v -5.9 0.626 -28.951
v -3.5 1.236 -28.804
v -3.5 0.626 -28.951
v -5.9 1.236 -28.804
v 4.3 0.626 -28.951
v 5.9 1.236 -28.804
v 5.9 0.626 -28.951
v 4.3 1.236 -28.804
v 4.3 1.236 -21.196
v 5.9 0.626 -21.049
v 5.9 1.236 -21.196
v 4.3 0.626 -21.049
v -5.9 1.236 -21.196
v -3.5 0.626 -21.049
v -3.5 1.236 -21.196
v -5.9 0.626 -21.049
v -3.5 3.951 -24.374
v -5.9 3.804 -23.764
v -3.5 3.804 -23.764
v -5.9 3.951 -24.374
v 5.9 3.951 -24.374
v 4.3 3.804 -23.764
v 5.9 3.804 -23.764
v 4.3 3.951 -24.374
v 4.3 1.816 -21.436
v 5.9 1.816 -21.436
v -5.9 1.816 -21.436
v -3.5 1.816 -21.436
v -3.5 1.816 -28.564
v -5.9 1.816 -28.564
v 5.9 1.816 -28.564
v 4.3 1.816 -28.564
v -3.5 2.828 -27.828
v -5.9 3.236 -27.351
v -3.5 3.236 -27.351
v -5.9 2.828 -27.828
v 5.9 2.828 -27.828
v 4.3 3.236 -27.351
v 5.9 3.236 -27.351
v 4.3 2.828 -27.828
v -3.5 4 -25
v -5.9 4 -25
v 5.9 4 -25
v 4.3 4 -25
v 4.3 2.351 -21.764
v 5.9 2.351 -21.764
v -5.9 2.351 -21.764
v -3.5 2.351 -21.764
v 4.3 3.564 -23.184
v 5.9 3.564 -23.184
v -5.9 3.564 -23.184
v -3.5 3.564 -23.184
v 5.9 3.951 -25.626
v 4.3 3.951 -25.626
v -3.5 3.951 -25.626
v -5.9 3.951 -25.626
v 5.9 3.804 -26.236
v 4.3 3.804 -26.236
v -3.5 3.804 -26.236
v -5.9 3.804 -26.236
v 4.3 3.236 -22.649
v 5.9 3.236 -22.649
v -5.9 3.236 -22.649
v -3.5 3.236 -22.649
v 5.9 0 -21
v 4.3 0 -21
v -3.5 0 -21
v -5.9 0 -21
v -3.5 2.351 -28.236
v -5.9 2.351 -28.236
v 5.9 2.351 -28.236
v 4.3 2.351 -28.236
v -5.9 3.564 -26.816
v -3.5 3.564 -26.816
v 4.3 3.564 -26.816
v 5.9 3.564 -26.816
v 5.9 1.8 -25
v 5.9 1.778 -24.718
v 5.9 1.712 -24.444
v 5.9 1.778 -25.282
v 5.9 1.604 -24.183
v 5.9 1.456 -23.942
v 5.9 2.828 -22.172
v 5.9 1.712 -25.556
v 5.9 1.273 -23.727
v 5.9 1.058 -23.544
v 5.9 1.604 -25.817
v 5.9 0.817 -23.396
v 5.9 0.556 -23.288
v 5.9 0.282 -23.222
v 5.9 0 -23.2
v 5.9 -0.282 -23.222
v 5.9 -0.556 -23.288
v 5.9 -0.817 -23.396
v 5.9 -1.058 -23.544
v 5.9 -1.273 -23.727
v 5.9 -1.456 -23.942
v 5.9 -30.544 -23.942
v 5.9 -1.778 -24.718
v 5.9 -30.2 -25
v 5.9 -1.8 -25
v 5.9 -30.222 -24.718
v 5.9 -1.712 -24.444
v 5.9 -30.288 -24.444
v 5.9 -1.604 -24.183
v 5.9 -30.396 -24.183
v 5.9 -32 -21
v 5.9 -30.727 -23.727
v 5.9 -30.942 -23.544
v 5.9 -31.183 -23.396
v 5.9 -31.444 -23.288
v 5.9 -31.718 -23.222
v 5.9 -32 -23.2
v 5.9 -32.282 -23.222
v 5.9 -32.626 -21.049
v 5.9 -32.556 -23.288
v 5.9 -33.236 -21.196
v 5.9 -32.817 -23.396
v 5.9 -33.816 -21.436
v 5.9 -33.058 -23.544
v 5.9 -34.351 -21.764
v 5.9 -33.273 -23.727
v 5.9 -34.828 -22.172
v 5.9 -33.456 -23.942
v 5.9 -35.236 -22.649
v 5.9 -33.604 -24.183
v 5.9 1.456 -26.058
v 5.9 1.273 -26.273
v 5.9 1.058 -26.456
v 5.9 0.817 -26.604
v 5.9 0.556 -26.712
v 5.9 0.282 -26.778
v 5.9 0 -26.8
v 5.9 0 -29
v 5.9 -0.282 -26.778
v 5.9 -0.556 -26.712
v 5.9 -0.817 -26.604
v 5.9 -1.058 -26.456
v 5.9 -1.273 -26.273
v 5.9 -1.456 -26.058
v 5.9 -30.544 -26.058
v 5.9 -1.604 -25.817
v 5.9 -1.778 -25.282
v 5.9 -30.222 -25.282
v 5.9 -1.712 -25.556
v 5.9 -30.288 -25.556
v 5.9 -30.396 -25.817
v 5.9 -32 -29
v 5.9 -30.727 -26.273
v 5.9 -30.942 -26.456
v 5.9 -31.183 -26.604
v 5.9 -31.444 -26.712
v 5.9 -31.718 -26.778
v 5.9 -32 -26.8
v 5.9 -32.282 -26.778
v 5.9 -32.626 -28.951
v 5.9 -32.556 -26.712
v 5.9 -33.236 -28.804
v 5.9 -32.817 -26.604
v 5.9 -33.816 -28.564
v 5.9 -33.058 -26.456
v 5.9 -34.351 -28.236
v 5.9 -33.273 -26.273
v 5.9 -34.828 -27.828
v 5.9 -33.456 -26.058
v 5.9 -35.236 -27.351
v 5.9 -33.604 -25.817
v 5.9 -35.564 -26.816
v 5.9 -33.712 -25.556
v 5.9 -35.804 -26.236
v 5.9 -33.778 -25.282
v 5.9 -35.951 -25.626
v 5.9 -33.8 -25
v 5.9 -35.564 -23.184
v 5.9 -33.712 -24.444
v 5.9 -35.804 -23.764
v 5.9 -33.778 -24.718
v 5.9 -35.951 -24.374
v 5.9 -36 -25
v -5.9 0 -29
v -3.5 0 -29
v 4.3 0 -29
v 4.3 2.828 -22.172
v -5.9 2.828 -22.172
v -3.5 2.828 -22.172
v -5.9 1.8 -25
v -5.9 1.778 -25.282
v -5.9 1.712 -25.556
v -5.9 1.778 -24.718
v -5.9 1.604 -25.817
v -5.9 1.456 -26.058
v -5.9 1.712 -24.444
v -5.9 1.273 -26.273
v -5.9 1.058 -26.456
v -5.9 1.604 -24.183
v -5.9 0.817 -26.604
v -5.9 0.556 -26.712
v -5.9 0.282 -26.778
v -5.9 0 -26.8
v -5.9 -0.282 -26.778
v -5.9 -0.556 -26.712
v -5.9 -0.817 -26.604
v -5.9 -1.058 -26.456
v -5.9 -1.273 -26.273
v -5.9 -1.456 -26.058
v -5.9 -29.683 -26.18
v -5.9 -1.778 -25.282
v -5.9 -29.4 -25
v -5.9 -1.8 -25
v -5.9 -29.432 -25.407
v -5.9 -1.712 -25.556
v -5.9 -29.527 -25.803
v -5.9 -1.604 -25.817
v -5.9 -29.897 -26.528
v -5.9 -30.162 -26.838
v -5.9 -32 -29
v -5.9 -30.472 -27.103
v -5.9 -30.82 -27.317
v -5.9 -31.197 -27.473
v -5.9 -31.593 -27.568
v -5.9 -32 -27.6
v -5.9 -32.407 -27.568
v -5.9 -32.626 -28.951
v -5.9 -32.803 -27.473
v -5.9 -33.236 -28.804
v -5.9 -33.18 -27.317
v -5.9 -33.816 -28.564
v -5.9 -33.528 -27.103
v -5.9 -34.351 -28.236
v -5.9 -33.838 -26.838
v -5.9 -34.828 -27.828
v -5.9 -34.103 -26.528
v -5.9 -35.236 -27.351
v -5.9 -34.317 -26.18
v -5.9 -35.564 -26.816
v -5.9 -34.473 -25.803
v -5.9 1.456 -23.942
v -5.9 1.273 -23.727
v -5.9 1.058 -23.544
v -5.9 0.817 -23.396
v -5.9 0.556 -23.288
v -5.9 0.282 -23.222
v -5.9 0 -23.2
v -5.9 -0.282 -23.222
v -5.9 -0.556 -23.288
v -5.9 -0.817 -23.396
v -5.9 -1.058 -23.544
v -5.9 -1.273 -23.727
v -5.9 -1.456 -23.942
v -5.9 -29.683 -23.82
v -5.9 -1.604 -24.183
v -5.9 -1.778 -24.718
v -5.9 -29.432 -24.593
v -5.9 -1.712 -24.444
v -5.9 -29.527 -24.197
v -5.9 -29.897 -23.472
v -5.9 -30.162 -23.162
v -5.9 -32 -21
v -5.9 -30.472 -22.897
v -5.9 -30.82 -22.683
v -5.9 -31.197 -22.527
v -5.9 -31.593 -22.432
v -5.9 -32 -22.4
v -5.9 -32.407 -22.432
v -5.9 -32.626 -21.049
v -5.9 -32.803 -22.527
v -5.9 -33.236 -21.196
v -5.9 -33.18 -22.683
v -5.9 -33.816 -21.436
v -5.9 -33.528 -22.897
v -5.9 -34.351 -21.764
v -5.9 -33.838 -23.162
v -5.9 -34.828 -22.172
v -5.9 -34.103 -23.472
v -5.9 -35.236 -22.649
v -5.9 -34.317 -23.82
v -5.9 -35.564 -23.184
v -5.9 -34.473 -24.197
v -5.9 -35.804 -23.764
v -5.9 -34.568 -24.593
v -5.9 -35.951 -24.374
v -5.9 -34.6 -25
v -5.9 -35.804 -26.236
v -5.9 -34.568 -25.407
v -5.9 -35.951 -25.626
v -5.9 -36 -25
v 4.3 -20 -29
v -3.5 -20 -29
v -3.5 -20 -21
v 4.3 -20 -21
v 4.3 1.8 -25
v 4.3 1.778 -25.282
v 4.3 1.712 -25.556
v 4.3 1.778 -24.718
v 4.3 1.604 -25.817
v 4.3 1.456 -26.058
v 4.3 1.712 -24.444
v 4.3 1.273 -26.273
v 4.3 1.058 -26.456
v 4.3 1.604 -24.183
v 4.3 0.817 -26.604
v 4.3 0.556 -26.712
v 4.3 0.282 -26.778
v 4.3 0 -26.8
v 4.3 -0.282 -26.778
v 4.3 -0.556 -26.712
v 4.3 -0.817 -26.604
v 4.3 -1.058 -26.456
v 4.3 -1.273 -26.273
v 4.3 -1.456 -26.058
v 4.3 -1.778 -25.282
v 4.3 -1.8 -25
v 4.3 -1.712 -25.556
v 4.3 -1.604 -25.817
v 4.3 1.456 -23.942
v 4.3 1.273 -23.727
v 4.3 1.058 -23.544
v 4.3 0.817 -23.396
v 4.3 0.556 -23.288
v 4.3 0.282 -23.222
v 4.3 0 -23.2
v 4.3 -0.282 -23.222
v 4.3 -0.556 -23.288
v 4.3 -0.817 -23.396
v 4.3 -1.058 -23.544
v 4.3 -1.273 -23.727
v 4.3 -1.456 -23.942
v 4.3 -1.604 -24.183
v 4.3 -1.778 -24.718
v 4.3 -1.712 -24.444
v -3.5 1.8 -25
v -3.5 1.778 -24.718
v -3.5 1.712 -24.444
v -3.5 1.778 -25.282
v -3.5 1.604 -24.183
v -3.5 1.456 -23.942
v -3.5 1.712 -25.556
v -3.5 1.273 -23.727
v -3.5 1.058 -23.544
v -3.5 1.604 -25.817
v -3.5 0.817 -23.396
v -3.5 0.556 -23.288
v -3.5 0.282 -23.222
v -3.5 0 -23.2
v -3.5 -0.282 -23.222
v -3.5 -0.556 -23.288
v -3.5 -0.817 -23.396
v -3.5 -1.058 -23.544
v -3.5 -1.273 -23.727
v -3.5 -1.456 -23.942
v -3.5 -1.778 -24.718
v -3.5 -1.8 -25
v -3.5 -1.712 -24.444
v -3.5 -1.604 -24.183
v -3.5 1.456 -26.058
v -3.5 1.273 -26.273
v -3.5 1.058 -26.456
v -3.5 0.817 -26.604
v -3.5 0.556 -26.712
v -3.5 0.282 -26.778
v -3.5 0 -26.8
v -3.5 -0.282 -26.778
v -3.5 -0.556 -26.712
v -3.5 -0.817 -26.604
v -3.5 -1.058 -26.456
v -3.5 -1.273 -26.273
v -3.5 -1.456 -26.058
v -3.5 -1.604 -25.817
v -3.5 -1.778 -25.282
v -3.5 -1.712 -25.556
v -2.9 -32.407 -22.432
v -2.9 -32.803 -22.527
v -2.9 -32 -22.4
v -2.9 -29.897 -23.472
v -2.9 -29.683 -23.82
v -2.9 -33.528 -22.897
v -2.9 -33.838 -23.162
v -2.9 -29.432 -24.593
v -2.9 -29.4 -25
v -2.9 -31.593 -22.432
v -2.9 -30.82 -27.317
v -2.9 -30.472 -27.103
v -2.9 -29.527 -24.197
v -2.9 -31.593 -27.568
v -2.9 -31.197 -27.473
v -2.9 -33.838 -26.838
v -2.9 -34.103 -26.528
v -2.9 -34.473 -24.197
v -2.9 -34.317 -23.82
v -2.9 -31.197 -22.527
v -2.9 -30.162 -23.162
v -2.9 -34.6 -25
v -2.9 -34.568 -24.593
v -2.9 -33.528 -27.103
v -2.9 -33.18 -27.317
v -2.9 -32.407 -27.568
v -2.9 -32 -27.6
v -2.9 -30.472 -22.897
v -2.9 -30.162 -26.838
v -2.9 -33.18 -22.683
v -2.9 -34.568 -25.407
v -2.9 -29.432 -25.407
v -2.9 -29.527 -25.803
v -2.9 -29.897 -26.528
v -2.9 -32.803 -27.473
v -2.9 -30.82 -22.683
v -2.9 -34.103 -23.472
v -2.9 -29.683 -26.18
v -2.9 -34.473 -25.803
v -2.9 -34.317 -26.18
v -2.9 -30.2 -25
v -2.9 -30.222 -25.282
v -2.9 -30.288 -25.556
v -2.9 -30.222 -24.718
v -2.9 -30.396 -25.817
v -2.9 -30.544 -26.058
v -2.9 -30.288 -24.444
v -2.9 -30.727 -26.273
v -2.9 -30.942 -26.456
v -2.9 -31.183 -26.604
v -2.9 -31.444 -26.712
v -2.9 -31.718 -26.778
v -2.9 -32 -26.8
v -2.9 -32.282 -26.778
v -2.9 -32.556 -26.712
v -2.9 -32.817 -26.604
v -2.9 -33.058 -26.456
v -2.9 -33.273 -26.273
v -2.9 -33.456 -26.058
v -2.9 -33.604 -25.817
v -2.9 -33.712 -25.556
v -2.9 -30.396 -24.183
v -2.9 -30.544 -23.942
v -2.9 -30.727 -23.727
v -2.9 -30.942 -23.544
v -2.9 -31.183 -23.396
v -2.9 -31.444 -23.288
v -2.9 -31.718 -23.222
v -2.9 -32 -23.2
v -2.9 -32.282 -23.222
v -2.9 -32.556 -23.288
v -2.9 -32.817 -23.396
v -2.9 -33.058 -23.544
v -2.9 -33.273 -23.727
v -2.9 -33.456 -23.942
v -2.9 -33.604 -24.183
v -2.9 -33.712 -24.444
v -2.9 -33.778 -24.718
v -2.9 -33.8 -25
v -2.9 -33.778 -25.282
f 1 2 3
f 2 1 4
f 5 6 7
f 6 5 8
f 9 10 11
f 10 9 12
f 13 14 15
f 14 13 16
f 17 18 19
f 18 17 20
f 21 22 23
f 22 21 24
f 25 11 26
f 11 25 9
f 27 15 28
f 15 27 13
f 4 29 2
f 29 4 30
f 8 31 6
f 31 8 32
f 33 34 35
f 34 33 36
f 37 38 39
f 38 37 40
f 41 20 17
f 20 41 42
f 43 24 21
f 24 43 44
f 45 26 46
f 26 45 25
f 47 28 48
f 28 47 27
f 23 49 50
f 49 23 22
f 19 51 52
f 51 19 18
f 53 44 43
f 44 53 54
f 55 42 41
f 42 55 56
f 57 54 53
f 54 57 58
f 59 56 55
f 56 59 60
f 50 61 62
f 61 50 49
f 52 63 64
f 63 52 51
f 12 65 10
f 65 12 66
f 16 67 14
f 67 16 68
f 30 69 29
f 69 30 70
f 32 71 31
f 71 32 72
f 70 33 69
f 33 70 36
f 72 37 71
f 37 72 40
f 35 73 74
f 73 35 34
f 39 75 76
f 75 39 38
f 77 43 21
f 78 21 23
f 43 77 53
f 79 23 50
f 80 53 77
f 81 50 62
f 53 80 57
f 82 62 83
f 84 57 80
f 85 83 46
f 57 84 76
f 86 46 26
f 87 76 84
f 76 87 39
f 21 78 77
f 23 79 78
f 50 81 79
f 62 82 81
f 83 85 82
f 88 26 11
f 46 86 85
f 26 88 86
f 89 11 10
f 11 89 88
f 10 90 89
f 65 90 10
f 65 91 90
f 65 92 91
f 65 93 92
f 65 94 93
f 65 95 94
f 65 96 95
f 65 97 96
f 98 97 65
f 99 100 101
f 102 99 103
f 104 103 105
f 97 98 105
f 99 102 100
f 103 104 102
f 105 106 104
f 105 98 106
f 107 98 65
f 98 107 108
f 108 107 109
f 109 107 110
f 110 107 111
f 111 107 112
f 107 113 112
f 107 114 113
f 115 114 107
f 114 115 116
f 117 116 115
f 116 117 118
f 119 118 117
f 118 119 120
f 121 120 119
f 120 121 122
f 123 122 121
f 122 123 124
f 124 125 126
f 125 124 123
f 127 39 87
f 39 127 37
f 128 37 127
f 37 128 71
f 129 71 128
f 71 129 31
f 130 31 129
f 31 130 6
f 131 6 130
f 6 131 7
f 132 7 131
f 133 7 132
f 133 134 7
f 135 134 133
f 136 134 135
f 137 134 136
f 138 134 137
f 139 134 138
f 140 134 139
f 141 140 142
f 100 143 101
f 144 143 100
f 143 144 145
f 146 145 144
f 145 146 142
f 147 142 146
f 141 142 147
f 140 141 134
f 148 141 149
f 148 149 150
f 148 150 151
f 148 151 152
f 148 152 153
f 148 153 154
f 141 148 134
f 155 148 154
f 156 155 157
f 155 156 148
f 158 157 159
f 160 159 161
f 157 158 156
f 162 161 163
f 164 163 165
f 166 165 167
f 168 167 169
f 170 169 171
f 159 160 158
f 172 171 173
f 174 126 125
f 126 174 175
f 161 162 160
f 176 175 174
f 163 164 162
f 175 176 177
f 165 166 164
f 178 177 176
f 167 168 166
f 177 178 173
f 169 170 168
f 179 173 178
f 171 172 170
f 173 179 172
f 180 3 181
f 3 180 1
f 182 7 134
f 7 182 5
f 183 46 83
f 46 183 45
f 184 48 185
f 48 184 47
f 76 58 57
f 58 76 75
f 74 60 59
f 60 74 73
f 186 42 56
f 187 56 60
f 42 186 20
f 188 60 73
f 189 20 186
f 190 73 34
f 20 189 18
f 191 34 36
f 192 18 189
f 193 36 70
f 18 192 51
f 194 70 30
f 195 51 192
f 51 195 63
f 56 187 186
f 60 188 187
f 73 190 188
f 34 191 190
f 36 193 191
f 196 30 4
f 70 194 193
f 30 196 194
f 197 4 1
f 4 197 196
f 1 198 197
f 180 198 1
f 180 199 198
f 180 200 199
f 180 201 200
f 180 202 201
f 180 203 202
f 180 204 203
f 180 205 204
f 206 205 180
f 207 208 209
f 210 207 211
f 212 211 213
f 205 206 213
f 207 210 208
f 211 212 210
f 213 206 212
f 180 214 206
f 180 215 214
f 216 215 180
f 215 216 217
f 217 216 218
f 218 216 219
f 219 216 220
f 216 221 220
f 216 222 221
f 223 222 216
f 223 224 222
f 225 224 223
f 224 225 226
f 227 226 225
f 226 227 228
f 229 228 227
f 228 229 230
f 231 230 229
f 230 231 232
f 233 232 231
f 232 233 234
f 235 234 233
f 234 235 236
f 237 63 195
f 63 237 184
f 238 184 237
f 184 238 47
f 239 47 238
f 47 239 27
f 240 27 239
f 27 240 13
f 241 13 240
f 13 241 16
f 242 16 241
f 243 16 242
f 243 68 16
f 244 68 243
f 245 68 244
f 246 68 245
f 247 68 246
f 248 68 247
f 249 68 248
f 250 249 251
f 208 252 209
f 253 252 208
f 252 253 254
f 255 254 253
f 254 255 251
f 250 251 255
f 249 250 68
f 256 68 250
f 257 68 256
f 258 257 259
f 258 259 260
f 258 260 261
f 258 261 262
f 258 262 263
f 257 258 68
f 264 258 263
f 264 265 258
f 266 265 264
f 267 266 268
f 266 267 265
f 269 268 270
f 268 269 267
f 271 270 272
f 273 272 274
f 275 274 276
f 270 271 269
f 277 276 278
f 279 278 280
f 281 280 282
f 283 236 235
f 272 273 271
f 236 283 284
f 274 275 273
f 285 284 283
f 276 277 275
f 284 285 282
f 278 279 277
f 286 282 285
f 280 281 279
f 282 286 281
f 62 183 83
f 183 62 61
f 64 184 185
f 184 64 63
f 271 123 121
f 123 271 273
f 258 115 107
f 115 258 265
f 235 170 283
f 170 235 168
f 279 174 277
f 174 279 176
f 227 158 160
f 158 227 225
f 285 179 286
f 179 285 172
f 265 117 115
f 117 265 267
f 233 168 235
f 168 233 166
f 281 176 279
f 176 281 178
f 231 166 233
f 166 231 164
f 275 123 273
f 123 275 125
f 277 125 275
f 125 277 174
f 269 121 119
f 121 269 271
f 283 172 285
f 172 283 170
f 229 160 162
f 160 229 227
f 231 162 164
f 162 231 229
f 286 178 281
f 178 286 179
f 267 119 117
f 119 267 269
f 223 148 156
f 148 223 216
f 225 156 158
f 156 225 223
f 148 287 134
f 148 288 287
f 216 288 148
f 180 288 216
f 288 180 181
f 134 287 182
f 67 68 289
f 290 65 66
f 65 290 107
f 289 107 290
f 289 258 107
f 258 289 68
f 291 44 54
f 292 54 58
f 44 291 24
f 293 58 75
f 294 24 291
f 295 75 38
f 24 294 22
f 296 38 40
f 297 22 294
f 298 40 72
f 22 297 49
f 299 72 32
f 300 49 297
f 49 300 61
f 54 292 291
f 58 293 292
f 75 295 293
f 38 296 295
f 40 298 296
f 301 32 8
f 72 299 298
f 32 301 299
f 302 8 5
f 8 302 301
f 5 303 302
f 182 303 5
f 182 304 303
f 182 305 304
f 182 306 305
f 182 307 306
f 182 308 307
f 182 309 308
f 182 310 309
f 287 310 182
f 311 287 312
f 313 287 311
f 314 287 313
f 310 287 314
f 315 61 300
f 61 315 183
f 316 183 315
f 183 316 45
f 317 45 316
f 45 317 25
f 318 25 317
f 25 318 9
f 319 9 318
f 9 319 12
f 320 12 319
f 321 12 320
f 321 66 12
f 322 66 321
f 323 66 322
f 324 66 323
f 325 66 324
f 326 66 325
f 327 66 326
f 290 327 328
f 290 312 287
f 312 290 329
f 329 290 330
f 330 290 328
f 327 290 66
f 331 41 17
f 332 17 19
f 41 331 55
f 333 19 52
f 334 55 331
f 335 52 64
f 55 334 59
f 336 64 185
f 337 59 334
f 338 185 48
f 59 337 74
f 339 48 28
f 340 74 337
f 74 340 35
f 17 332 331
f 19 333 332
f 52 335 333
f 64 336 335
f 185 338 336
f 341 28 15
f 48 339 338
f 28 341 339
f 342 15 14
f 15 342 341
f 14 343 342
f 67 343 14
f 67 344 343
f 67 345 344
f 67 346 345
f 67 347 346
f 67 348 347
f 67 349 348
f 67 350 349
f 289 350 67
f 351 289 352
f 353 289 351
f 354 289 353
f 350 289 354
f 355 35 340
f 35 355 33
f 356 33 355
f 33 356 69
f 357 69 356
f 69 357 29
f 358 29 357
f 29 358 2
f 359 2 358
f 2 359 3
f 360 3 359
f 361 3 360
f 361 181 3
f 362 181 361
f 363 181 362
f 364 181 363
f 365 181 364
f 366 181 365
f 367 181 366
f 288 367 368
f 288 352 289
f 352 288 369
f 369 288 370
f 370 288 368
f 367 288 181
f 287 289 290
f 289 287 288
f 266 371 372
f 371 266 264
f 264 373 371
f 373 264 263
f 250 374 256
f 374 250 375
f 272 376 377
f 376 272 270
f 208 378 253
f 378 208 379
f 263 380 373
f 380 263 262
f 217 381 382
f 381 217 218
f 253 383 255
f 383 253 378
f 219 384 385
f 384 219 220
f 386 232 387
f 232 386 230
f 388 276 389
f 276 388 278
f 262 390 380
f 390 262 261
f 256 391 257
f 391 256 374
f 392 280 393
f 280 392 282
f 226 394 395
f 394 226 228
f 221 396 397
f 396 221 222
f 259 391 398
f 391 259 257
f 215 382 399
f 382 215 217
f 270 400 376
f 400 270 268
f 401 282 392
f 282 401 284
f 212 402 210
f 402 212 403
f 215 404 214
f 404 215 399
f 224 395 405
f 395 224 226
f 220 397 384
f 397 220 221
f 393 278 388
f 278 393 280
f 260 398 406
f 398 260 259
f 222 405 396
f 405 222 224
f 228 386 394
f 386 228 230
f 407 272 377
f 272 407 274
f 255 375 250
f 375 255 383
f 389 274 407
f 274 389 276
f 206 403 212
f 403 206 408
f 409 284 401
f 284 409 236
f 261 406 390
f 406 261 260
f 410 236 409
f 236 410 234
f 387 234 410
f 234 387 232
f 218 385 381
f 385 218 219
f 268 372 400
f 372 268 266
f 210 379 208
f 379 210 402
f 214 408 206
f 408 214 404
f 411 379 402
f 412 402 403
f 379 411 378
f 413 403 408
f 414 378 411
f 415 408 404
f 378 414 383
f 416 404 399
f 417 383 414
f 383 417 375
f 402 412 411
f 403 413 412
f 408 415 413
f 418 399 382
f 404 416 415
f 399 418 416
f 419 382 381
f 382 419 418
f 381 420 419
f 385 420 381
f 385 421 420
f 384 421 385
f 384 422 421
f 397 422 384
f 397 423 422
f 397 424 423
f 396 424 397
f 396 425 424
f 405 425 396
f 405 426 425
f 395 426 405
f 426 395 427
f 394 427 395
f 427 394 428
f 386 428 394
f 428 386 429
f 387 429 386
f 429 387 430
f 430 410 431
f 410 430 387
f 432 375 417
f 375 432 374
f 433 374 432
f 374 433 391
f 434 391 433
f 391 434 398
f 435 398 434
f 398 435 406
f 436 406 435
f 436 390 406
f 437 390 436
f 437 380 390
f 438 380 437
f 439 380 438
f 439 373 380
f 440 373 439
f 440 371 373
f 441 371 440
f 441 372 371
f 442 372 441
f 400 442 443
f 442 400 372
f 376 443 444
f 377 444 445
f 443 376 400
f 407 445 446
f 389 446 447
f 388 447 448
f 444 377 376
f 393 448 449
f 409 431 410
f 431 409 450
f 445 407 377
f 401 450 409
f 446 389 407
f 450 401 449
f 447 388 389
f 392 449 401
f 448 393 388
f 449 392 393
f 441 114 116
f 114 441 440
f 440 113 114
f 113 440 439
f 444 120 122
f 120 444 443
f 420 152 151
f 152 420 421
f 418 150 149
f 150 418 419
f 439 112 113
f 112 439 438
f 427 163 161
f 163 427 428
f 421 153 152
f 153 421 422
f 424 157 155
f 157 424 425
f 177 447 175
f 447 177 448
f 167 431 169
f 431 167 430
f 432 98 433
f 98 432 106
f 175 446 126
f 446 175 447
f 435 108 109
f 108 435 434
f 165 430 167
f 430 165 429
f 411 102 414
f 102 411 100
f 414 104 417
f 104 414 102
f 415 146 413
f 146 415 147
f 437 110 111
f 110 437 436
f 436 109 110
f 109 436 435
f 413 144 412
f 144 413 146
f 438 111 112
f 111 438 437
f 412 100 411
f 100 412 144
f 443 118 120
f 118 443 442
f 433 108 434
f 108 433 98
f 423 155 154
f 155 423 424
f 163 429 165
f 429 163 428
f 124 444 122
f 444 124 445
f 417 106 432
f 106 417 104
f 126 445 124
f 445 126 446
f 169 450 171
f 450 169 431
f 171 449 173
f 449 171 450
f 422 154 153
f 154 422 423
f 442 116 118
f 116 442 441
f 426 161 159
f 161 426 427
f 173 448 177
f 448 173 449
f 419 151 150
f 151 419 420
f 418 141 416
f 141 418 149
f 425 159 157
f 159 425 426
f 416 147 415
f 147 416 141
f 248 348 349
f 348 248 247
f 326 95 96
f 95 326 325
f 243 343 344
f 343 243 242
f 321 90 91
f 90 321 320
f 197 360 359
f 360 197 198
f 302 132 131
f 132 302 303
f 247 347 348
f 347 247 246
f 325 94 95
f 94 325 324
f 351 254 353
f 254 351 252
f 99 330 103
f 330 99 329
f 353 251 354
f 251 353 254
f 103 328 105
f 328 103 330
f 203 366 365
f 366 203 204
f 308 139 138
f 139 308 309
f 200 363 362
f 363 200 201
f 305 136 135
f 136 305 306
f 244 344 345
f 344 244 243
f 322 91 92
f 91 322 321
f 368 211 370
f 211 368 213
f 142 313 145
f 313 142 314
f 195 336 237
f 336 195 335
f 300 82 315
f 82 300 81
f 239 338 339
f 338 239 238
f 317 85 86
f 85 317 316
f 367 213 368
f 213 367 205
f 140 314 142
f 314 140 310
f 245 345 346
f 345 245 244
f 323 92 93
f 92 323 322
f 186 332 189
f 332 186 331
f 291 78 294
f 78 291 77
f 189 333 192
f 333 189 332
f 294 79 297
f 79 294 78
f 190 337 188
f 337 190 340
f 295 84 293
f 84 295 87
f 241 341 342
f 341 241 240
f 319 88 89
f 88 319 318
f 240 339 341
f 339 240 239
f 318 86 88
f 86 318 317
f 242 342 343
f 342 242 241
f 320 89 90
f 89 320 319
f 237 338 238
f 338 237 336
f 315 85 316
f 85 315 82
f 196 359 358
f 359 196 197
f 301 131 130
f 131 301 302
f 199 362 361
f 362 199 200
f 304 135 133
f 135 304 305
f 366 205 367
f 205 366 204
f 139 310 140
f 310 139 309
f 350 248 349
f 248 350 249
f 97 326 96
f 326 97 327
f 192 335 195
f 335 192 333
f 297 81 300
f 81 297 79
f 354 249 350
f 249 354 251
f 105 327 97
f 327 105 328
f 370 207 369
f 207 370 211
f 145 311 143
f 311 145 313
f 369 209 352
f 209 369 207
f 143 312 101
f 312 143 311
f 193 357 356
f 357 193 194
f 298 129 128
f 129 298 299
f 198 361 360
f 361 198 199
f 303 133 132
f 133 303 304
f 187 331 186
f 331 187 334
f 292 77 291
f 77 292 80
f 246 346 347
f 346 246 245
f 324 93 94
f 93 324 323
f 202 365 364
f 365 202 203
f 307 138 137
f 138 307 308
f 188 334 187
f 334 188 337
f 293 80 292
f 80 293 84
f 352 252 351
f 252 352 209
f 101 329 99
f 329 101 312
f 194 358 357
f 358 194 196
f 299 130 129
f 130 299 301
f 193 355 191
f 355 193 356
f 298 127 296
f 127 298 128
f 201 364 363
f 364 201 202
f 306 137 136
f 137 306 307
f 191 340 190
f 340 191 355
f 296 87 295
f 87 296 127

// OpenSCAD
show_part_1 = 0;
show_part_2 = 0;
show_part_3 = 1;


$fn = 40;

circle_hole_h = 4.5;
top_wall = 4;
circle_wall = 1.5;
wall = 2;


top_d = 19.5;
sensor_d = 79;
sensor_tail_width = 7;
sensor_tail_height = 0.4;
bolt_d = 3;
bolt_d_through = 3.6;
bolt_head_h = 2.8;
bolt_head_d = 5.7;

servo_pole_h = 30;
servo_pole_w = sensor_tail_width;
servo_pole_len = top_d/2+wall;
servo_pole_extra_len = 5;
servo_pole_out_len = 5;
servo_pole_hole_off = 5;

pole_gap = 0.4;

servo_handle_len = 40;
servo_handle_h = 8;
servo_handle_w = servo_pole_w+2*wall+2*pole_gap;
servo_hole_d = 5.2;
servo_hole_sz = 3;
servo_bolt_d = 3.6;

module pipette_pusher() {
	difference() {
		cylinder(d=top_d+2*circle_wall, h=top_wall+circle_hole_h);
		for(yp=[0, 6]) {
			translate([0, yp, 0]) {
				cylinder(d=bolt_d_through, h=top_wall);
				translate([0, 0, top_wall-bolt_head_h]) {
					cylinder(d=bolt_head_d, h=top_wall+2);
				}
			}
		}
		translate([0, 0, top_wall]) {
			cylinder(d=top_d, h=circle_hole_h);
			translate([-sensor_tail_width/2, 0, 0]) {
				cube([sensor_tail_width, top_d/2+wall, wall]);
			}
		}
	}
}

module servo_pole() {
//	union() {
	difference() {
		translate([0, -servo_pole_extra_len, 0]) {
			intersection() {
//			union() {
				cube([servo_pole_w, servo_pole_len+servo_pole_extra_len+servo_pole_out_len, servo_pole_h]);
				translate([0, servo_pole_len/2, servo_pole_h/2]) {
					rotate([0, 90, 0]) {
						cylinder(d=servo_pole_h+7, h=servo_pole_w);
					}
				}
			}
		}
		translate([servo_pole_w/2, 0, servo_handle_h]) {
			for(yp=[0, 6]) {
				translate([0, yp, 0]) {
					cylinder(d=bolt_d, h=servo_pole_h);
				}
			}
		}
		for(p=[[0, 0, bolt_d_through], [12, 0, bolt_d], [12, 10, bolt_d], [12, 20, bolt_d]]) {
			translate([-10, p[0], p[1]+servo_pole_hole_off]) {
				rotate([0, 90, 0]) {
					cylinder(d=p[2], h=30);
				}
			}
		}
	}
}

module servo_handle() {
	difference() {
		difference() {
			union() {
				cube([servo_handle_w, servo_handle_len-servo_handle_h, servo_handle_h]);
				for(s=[0, 1]) {
					translate([0, s*(servo_handle_len-servo_handle_h), servo_handle_h/2]) {
						rotate([0, 90, 0]) {
							cylinder(d=servo_handle_h, h=servo_handle_w);
						}
					}
				}
			}
			translate([pole_gap+wall, -servo_handle_h, 0]) {
				cube([servo_pole_w+2*pole_gap, servo_handle_len/2+servo_handle_h, servo_handle_h]);
			}
		}
		translate([-10, 0, servo_handle_h/2]) {
			rotate([0, 90, 0]) {
				cylinder(d=bolt_d_through, h=30);
			}
		}
		// servo hole
		translate([0, servo_handle_len-servo_handle_h, servo_handle_h/2]) {
			rotate([0, 90, 0]) {
				cylinder(d=servo_hole_d, h=servo_hole_sz);
				cylinder(d=servo_bolt_d, h=20);
			}
		}
	}
}

if(show_part_1) {
	pipette_pusher();
}
if(show_part_2) {
	translate([-servo_pole_w/2, 0, -servo_pole_h]) {
		servo_pole();
	}
}
if(show_part_3) {
	translate([-servo_handle_w/2, 0, -servo_pole_h+servo_handle_h/2+servo_pole_hole_off]) {
		rotate([180, 0, 0]) {
			translate([0, 0, 0]) {
				servo_handle();
			}
		}
	}
}	
